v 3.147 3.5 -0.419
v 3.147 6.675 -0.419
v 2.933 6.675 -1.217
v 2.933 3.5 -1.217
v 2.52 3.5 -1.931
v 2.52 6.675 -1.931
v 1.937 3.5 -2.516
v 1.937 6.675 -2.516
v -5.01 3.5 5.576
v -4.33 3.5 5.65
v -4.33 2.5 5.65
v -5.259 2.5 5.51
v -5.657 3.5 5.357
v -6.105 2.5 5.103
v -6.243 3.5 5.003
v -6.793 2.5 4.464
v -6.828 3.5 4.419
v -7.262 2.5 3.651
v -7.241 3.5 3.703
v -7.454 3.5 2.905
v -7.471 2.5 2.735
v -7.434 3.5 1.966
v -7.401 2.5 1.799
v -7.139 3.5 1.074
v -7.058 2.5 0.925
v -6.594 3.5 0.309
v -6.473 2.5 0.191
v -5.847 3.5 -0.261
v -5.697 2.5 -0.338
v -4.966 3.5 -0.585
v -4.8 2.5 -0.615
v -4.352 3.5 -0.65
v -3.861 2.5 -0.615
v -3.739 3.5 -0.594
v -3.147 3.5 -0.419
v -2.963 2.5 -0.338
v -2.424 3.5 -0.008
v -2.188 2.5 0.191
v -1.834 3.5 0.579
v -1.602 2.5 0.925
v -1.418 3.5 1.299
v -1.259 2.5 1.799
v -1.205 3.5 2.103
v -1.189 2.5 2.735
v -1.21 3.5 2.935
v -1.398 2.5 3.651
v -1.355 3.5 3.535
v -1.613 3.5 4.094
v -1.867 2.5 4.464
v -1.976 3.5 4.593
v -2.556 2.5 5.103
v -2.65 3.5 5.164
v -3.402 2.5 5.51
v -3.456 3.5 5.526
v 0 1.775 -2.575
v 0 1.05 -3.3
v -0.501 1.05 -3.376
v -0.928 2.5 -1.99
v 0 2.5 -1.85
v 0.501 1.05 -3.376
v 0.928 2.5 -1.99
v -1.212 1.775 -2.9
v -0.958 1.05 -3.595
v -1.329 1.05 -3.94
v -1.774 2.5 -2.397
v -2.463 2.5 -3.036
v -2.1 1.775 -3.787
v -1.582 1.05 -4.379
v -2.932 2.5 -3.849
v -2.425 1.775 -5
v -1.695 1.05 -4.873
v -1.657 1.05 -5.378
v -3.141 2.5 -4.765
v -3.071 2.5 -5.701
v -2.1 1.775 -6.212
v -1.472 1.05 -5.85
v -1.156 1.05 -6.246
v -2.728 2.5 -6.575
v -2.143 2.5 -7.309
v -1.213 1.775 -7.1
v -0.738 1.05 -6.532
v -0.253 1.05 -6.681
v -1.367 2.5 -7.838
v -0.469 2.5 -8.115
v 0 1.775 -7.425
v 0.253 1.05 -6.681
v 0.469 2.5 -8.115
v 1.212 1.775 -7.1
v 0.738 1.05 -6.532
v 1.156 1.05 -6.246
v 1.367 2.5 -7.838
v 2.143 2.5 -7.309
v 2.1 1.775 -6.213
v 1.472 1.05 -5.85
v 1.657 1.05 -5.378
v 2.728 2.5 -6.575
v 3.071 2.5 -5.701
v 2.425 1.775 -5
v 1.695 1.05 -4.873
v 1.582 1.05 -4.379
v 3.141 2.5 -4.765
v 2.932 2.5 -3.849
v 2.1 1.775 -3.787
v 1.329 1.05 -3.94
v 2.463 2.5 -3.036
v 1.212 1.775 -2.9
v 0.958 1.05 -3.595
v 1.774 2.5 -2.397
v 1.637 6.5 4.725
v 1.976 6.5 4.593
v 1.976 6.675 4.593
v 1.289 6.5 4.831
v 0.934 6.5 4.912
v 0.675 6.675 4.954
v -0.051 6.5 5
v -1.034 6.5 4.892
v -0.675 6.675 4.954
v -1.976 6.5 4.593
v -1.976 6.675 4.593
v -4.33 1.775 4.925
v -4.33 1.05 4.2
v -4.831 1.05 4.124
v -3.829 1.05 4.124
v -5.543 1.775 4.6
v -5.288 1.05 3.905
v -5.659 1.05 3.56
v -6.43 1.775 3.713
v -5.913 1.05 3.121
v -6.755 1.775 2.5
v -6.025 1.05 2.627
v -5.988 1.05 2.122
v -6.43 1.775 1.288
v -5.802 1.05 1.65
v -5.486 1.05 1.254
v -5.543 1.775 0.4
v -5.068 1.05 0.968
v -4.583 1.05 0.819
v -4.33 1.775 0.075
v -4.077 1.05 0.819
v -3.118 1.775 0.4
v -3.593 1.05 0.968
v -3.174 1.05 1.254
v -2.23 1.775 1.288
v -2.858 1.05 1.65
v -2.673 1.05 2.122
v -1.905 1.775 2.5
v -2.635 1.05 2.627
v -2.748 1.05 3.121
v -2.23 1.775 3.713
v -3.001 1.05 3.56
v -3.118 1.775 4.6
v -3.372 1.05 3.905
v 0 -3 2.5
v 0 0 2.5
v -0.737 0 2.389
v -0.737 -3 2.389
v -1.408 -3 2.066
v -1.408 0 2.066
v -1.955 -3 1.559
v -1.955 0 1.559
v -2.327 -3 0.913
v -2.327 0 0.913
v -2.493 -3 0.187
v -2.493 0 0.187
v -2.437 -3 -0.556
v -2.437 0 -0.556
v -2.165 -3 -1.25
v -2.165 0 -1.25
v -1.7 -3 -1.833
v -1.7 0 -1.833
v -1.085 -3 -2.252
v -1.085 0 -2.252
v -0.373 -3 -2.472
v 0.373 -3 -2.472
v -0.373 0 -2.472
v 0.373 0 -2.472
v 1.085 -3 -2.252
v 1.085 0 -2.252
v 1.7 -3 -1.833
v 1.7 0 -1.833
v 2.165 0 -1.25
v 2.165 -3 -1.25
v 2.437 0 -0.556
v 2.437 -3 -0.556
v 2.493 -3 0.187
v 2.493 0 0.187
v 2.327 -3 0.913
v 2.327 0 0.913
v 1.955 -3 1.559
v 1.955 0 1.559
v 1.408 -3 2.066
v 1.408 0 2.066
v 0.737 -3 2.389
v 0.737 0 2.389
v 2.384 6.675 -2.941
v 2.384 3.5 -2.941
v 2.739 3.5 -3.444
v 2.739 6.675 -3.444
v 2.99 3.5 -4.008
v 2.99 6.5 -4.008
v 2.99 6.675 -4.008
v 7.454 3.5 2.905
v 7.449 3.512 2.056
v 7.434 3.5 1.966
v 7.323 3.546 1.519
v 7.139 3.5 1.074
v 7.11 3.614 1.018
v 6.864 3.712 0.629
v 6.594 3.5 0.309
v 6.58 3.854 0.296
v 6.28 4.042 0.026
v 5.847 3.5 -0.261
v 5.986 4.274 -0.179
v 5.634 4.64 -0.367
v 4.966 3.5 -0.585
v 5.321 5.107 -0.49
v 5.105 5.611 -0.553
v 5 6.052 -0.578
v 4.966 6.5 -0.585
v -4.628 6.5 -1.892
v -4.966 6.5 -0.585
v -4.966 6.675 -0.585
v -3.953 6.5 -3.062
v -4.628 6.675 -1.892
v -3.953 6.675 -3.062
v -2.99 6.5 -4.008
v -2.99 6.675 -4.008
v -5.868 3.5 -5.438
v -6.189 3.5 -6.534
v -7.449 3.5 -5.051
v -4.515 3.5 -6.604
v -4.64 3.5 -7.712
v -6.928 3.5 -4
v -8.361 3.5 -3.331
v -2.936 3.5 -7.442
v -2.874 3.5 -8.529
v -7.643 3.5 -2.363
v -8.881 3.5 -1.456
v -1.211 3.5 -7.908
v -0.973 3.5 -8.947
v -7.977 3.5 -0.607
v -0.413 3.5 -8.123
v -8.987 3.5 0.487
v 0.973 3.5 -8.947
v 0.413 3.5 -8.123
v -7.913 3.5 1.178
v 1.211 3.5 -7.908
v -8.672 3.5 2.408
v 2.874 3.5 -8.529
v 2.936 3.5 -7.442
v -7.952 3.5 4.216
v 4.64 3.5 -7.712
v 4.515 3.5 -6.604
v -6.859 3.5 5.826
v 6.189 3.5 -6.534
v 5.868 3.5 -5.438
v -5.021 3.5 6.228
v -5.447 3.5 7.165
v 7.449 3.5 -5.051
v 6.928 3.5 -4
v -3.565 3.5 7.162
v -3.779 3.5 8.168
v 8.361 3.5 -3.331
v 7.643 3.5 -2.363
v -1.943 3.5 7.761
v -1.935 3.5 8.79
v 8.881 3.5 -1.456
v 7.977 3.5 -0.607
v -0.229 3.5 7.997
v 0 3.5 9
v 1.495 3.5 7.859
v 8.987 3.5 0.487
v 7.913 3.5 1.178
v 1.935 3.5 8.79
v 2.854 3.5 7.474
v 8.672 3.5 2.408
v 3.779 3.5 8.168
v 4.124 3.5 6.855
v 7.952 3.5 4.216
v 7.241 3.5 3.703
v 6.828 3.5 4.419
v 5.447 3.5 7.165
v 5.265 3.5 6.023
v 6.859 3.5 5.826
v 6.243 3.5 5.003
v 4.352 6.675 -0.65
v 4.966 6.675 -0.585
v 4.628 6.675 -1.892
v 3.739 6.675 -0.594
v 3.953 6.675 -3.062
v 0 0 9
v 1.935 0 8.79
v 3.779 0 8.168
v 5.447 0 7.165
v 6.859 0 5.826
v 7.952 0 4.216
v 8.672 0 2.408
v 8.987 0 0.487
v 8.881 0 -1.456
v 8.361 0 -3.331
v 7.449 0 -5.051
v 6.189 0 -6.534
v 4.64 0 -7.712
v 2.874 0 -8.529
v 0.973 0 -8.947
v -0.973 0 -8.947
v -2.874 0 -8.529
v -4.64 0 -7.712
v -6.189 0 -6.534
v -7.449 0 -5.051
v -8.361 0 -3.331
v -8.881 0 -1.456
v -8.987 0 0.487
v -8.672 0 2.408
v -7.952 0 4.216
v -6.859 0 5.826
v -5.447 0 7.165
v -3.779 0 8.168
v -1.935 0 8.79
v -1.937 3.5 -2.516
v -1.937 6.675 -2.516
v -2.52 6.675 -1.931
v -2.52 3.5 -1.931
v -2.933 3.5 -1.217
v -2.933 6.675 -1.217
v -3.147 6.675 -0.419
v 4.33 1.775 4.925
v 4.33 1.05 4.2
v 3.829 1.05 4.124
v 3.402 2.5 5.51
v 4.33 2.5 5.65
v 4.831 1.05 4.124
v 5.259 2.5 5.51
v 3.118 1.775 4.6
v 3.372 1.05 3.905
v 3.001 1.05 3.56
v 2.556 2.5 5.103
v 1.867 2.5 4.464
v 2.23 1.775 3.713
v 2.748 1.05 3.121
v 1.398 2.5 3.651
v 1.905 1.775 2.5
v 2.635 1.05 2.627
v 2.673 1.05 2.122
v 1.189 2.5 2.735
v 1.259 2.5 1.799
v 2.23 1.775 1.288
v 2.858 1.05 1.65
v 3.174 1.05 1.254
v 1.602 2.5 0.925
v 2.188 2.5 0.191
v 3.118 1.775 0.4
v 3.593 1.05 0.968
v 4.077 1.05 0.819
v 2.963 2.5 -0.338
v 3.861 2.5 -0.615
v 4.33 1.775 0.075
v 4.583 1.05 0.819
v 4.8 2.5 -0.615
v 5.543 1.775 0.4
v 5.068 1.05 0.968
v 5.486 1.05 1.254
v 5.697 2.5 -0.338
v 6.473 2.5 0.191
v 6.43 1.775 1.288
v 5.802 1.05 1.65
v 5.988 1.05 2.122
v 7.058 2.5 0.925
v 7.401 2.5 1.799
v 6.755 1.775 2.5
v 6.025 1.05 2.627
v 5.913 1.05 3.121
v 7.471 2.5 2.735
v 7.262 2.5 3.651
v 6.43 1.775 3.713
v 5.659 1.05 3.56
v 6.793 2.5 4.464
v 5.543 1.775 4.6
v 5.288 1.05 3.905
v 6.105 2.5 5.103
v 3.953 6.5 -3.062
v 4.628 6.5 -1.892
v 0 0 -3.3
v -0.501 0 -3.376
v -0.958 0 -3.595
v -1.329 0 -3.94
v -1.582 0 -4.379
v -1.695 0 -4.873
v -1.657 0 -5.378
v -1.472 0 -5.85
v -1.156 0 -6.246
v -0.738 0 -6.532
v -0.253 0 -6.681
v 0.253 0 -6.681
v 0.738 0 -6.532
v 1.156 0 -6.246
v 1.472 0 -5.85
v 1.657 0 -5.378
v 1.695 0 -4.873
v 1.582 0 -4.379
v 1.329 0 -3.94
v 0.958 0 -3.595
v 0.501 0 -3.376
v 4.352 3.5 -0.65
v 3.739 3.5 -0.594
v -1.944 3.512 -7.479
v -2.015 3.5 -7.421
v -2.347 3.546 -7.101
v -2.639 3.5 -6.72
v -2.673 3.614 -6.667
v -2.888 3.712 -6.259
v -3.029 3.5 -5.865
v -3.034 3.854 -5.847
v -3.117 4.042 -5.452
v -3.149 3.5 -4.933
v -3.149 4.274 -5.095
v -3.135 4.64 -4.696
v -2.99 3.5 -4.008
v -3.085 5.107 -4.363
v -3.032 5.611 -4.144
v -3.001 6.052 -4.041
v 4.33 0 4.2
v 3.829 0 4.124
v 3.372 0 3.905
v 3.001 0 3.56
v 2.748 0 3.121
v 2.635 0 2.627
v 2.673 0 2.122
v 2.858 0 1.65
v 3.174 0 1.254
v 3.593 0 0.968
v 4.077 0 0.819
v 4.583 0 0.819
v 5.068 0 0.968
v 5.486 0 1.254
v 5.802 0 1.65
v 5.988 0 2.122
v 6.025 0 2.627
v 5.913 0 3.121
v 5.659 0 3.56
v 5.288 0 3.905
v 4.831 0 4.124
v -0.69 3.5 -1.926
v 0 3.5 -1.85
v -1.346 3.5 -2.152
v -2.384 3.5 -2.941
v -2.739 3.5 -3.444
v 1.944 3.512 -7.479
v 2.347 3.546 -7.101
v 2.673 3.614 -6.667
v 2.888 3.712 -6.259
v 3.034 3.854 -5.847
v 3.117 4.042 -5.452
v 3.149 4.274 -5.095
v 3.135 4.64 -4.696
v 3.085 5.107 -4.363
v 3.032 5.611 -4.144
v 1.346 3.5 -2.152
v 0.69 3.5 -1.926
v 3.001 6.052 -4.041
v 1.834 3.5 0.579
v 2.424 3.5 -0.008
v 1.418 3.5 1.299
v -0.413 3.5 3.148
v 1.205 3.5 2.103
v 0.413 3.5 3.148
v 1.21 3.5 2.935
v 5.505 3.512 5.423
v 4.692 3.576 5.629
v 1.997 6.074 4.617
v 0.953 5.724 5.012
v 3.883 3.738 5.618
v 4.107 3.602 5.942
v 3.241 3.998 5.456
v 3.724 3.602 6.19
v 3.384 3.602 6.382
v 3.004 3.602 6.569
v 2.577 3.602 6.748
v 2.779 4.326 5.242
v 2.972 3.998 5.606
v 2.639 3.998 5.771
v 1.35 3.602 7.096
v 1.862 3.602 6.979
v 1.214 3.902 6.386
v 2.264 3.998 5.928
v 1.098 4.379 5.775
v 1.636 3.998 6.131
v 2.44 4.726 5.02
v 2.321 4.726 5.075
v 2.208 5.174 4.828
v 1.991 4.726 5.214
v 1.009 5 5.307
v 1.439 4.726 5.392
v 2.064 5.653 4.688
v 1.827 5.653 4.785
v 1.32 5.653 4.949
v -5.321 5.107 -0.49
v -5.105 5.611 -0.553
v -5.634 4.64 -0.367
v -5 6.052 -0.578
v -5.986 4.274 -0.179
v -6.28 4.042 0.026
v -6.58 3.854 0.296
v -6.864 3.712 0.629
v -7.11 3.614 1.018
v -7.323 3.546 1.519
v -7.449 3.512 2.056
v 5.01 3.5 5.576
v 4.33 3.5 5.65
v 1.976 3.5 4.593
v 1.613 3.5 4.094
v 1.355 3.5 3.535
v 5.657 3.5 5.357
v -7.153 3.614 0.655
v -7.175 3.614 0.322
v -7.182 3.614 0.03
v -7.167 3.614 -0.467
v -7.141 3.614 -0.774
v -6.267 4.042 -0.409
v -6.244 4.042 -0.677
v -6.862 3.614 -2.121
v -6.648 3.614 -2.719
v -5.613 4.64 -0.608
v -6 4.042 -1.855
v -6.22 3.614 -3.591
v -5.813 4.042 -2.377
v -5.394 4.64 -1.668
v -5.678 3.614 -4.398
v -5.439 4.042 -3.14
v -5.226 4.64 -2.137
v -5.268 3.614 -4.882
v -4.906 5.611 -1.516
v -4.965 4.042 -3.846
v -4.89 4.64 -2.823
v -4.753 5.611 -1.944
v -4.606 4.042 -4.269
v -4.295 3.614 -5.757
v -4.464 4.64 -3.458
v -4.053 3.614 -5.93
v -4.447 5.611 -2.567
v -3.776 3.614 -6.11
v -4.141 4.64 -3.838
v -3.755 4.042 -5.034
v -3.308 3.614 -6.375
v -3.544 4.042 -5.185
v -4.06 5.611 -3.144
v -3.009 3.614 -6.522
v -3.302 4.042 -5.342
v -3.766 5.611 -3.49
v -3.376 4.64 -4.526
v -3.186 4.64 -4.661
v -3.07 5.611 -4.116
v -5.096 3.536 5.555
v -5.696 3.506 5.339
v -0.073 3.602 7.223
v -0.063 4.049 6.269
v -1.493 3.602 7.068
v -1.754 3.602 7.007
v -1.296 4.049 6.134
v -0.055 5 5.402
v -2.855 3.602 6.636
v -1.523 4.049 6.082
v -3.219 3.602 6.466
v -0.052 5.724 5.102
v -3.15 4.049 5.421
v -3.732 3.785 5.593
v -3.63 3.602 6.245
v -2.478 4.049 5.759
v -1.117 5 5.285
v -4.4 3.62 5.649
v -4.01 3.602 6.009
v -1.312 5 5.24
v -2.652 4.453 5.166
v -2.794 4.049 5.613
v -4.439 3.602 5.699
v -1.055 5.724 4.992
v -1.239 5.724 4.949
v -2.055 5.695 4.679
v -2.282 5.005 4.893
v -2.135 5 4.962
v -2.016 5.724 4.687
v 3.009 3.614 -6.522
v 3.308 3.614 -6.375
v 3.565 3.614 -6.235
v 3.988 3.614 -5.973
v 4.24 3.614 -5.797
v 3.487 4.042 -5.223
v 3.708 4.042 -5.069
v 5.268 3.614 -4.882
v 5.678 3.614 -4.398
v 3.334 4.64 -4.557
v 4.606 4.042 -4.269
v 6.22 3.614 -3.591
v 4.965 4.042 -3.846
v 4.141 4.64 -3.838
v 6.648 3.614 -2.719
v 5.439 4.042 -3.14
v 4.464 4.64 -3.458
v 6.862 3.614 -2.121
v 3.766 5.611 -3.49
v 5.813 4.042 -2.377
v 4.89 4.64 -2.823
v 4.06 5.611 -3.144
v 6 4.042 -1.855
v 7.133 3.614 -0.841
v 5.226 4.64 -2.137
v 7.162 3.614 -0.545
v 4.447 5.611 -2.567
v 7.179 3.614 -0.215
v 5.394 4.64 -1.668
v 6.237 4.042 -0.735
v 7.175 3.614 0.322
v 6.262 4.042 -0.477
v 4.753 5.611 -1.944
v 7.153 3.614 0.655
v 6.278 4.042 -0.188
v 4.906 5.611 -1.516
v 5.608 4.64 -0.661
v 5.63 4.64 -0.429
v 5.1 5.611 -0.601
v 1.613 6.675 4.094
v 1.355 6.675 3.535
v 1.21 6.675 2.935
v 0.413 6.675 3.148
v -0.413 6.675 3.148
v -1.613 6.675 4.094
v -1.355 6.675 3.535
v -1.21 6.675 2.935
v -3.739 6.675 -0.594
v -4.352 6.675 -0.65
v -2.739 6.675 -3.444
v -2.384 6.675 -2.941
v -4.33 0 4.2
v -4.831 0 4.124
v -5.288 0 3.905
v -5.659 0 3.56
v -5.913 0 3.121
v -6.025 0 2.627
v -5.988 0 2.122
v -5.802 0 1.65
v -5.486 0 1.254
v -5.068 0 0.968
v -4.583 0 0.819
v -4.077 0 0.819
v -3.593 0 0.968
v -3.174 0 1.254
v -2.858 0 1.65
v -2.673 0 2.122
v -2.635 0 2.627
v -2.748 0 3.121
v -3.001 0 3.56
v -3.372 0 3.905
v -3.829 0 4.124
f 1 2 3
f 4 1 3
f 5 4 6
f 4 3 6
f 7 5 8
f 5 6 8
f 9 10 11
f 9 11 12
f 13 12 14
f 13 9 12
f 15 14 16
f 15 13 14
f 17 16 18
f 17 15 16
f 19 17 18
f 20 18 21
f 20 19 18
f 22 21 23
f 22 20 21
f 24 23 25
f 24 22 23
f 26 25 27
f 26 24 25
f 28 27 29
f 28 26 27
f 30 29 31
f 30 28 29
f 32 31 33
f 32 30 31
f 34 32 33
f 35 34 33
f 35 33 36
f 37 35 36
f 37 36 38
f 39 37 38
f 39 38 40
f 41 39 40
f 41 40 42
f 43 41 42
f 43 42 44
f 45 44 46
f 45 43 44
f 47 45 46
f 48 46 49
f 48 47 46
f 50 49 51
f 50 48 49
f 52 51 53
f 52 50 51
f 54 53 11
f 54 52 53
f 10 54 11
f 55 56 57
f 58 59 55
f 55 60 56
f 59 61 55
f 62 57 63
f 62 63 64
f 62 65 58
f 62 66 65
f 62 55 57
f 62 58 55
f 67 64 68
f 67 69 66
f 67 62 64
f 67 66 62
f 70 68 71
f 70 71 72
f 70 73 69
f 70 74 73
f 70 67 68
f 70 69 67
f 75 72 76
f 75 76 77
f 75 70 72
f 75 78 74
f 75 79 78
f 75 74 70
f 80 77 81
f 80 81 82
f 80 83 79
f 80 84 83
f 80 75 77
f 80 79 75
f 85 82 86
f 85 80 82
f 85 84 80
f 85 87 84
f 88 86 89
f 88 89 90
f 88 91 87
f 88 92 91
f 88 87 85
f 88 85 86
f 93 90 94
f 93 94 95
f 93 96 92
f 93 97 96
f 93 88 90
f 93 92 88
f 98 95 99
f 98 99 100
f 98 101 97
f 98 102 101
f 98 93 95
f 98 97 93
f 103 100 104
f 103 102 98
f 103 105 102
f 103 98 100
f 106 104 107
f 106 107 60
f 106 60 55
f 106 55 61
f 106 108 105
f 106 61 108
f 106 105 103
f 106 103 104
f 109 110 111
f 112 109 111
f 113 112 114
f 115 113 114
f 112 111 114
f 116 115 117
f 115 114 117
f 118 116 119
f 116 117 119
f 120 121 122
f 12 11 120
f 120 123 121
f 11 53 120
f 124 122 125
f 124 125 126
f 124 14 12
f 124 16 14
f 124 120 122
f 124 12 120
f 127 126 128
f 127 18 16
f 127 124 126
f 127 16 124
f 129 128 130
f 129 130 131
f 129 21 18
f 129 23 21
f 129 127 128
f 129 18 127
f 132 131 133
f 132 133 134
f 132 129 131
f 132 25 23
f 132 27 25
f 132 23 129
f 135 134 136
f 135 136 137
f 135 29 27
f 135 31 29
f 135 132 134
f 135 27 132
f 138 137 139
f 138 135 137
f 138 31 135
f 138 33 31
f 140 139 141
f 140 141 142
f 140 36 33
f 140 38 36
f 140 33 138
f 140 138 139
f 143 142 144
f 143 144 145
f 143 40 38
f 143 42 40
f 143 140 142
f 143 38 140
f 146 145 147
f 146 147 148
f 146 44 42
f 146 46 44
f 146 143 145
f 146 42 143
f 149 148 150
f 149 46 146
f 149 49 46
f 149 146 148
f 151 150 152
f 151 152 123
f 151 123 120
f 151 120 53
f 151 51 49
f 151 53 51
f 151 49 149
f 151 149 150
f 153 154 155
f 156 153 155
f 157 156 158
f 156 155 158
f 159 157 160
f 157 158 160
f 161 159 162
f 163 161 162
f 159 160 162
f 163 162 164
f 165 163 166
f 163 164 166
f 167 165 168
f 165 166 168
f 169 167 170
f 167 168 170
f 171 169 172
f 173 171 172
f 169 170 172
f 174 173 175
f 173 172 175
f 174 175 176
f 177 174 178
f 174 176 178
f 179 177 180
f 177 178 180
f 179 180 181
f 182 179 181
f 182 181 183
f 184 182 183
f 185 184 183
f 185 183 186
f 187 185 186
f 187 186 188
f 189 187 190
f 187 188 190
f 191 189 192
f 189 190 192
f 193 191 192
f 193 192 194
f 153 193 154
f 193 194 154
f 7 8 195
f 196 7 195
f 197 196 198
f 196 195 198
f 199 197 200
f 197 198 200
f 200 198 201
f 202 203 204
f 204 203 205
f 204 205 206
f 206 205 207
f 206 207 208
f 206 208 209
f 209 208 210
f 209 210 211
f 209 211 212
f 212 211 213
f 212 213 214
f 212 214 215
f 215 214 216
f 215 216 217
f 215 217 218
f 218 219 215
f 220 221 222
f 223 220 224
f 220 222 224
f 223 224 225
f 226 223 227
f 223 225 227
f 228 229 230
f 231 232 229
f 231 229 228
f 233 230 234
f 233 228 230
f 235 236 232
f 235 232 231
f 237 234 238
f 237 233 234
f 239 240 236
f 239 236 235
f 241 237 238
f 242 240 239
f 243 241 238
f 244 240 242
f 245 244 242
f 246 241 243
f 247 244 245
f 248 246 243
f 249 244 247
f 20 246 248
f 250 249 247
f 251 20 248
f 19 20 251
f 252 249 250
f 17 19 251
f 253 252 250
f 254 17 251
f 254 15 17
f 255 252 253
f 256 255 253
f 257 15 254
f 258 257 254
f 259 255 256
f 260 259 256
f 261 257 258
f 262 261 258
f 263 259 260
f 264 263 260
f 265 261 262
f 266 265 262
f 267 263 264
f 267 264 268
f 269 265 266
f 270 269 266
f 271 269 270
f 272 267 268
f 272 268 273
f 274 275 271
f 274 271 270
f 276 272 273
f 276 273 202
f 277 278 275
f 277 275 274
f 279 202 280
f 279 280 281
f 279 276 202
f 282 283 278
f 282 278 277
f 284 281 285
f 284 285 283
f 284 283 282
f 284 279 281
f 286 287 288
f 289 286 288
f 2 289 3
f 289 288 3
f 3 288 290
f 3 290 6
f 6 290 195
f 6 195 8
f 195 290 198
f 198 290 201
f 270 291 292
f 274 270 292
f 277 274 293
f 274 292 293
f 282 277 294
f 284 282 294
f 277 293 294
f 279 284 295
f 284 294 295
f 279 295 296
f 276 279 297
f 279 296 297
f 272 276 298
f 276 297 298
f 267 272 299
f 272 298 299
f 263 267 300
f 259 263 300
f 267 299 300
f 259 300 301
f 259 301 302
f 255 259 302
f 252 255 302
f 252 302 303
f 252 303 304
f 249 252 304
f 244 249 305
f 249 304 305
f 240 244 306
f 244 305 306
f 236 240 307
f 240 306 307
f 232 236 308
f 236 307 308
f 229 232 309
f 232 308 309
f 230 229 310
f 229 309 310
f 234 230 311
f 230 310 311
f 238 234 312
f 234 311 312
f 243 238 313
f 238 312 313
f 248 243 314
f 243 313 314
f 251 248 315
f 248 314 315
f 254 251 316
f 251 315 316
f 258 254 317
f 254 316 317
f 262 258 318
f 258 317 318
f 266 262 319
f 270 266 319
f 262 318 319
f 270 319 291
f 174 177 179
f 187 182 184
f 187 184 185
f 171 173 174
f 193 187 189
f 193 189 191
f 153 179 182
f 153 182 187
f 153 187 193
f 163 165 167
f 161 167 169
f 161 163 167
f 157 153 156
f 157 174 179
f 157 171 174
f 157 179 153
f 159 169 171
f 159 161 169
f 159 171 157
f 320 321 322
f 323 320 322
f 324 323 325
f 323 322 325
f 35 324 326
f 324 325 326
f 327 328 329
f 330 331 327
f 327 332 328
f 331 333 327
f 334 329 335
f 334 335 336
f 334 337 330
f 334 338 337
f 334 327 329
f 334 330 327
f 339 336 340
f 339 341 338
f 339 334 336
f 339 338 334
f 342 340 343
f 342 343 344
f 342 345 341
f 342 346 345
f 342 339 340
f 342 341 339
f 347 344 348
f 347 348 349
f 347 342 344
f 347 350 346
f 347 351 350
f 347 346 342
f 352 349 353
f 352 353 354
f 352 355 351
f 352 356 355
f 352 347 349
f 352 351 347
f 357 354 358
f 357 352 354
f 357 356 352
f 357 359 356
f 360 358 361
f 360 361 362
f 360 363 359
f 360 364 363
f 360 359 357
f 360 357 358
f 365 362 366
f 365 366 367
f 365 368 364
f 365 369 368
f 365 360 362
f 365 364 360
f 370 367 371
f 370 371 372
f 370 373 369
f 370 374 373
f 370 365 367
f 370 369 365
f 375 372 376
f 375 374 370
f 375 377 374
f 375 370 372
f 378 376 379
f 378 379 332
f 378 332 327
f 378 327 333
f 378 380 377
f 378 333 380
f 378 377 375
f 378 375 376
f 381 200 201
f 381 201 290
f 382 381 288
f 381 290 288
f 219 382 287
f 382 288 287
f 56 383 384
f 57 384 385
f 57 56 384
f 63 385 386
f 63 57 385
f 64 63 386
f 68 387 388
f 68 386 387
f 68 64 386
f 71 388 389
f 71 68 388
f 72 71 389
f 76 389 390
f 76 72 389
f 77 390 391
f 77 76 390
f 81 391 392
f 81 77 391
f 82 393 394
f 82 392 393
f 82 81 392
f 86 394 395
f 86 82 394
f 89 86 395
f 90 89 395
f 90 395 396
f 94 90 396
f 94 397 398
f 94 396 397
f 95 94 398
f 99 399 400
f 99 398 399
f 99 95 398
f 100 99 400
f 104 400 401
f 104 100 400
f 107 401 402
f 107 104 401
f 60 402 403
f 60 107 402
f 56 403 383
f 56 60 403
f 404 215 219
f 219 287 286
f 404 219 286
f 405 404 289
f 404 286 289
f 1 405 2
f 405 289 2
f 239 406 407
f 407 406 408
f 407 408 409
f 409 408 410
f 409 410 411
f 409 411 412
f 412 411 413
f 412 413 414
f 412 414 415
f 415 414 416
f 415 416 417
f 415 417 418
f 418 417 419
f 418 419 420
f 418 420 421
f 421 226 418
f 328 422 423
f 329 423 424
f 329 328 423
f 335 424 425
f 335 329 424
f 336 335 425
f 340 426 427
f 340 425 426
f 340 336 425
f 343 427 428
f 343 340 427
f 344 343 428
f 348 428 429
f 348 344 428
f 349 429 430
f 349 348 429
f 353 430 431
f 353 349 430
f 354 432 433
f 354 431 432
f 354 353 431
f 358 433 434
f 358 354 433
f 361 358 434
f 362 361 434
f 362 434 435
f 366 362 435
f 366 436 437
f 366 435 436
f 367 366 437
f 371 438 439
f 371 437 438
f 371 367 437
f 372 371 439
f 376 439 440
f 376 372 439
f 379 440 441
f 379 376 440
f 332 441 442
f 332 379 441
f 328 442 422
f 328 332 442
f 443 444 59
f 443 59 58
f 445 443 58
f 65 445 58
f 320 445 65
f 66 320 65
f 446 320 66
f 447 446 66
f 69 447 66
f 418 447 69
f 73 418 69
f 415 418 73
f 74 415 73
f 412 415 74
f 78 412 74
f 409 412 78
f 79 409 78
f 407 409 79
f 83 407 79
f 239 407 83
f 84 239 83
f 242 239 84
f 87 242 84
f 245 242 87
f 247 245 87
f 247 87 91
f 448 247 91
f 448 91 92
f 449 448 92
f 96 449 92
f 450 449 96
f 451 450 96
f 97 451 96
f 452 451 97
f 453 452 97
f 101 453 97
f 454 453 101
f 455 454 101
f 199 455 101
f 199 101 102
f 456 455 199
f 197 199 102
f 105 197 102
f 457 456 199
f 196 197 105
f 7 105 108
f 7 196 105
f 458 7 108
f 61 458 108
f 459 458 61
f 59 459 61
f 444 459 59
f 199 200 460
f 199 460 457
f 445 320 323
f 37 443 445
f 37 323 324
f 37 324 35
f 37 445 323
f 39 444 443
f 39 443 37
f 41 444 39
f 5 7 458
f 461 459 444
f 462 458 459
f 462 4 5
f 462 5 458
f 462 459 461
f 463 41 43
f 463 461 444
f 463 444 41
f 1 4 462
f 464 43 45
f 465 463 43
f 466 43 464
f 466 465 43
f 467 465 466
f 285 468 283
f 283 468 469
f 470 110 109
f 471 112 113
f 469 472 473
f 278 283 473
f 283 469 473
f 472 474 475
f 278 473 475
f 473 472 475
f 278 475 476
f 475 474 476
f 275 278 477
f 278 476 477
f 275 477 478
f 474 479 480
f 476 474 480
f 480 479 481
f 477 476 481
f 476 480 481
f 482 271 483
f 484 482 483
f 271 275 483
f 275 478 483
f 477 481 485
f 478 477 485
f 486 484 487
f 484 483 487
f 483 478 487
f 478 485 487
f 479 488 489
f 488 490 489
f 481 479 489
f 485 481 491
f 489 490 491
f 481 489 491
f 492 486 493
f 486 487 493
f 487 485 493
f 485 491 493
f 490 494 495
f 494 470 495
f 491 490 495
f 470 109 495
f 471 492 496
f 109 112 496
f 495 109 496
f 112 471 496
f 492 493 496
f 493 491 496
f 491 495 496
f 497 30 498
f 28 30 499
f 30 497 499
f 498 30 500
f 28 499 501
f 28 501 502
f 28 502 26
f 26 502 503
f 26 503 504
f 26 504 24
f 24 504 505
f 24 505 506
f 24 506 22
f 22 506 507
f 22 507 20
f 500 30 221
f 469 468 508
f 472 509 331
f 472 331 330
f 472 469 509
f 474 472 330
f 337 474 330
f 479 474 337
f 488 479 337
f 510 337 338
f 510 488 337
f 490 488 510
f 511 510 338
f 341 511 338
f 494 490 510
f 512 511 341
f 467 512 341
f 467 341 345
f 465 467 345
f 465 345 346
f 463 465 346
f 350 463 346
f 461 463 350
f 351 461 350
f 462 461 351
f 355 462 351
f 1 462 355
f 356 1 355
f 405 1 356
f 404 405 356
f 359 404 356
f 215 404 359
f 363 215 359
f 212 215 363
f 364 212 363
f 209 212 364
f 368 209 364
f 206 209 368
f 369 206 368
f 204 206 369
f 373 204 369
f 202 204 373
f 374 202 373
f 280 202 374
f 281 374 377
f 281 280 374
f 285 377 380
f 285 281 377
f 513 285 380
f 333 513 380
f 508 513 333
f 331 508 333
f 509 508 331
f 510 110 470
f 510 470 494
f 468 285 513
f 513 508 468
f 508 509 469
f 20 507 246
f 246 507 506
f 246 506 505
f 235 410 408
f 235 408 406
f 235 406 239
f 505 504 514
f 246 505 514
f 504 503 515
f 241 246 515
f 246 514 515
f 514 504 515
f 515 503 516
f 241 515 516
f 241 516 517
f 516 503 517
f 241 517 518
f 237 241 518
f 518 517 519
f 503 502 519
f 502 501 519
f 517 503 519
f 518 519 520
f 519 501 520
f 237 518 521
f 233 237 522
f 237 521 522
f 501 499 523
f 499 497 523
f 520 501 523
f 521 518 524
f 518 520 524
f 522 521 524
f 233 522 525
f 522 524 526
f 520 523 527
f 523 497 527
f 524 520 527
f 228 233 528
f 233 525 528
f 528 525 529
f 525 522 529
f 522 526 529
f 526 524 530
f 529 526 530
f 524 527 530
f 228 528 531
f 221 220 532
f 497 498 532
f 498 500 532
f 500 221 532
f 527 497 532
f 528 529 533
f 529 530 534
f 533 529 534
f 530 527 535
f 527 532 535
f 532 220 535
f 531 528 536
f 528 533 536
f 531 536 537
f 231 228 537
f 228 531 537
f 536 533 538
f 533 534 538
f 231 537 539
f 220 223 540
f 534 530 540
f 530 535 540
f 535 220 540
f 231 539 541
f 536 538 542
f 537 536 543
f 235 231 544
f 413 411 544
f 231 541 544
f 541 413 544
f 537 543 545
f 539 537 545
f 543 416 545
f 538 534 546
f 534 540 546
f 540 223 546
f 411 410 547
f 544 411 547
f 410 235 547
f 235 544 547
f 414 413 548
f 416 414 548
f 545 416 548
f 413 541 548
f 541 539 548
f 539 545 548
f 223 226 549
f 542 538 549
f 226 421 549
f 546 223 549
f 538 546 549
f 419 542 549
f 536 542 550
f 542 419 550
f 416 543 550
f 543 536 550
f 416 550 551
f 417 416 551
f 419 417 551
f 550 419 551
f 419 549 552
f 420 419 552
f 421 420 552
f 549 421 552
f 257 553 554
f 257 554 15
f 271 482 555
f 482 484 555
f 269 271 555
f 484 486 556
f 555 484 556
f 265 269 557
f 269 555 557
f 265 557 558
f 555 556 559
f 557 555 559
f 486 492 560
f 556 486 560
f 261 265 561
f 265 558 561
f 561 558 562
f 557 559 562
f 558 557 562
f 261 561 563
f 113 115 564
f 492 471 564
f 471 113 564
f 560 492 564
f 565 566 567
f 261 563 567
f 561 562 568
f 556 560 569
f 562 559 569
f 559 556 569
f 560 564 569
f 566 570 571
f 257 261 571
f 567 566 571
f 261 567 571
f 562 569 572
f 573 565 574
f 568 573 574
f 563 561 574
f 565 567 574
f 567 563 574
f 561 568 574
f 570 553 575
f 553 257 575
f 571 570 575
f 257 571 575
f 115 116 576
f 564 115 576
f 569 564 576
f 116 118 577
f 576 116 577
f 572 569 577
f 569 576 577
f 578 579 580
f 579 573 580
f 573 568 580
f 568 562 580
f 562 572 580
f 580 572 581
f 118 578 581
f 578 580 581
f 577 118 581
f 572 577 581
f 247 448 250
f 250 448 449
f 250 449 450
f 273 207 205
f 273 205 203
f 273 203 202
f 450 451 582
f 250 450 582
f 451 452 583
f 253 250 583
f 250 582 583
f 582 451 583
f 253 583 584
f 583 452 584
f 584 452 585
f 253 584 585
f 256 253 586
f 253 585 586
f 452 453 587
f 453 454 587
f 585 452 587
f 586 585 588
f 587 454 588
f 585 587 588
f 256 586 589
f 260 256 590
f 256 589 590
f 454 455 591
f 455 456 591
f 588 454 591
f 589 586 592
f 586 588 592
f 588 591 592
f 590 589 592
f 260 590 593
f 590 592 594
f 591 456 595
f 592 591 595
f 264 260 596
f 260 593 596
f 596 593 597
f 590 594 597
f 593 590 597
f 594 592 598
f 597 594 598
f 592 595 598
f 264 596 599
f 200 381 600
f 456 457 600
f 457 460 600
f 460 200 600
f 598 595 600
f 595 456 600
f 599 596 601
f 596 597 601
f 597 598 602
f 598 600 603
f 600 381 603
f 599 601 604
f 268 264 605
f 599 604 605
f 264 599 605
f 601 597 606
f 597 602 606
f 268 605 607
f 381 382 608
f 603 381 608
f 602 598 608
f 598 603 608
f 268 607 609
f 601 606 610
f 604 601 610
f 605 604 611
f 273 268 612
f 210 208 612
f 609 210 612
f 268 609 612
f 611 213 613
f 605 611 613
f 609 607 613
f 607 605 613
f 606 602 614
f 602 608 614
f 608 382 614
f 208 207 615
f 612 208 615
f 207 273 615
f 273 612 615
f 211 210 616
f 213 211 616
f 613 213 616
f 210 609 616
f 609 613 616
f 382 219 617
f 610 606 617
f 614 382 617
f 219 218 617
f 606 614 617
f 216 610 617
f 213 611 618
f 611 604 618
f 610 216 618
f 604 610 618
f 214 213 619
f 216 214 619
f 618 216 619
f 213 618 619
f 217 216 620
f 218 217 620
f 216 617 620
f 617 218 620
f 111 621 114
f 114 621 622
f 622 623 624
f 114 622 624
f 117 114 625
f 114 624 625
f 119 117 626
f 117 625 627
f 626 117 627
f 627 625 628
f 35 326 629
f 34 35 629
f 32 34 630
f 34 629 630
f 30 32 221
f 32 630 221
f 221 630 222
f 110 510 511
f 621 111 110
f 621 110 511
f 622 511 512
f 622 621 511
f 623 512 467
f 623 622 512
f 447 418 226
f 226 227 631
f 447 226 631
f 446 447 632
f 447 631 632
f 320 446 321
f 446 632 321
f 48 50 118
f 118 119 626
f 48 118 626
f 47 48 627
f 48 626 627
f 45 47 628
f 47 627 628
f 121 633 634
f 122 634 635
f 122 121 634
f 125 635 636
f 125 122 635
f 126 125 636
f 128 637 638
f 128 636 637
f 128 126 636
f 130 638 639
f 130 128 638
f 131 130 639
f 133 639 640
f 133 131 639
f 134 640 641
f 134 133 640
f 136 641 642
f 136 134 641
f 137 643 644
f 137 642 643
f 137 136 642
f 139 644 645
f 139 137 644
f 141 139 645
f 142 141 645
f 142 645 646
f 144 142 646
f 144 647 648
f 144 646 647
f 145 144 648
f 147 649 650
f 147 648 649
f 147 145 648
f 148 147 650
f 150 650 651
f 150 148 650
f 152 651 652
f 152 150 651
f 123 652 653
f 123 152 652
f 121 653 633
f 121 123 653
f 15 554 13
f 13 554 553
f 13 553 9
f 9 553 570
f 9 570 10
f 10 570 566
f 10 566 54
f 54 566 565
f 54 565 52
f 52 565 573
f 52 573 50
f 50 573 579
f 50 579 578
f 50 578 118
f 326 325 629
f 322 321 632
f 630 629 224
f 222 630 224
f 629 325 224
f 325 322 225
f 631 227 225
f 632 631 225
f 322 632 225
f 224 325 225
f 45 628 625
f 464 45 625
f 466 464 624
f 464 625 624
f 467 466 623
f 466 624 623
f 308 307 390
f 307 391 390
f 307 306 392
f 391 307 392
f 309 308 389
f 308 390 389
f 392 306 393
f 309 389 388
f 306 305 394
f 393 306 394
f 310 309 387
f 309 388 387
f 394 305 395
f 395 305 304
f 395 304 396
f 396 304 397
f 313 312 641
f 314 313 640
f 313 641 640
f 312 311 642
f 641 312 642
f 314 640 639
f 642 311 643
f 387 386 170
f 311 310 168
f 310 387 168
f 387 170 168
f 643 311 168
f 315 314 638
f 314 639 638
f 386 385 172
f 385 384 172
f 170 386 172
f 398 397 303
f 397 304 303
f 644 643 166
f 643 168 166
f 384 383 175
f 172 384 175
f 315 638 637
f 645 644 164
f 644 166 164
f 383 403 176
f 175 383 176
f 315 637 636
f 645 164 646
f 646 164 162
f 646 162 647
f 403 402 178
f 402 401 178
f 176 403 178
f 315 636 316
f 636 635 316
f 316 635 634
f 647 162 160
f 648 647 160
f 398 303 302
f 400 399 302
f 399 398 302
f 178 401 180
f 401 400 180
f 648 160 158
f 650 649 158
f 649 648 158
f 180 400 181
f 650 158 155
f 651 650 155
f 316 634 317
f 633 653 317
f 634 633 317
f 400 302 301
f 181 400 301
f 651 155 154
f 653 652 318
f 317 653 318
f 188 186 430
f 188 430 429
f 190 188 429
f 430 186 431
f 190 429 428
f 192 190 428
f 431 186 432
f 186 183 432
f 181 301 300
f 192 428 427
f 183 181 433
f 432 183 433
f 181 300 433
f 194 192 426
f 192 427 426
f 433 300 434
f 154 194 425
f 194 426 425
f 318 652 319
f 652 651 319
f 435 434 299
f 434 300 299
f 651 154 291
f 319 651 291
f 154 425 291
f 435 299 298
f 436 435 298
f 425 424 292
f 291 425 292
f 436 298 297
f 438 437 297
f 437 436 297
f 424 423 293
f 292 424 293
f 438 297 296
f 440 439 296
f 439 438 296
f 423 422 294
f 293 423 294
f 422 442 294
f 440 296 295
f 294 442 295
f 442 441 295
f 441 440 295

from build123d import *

# Parameters (mm, degrees)
SKETCH1_R                                      = 9
BOSS_EXTRUDE1_DEPTH                            = 3.5
CSK_FOR_M3_FLAT_HEAD_MACHINE_SCREW1_AT_2_COUNT = 2
CSK_FOR_M3_FLAT_HEAD_MACHINE_SCREW1_AT_2_PITCH = 8.660254038
CSK_FOR_M3_FLAT_HEAD_MACHINE_SCREW1_AT_3_COUNT = 2
CSK_FOR_M3_FLAT_HEAD_MACHINE_SCREW1_AT_3_PITCH = 8.660254038
BOSS_EXTRUDE2_START                            = 3.175
BOSS_EXTRUDE2_DEPTH                            = 3.175
FILLET1_R                                      = 3
SKETCH6_R                                      = 2.5
BOSS_EXTRUDE3_DEPTH                            = 3


with BuildPart() as part:
    # Sketch1 → Boss-Extrude1 (new body)
    with BuildSketch(Plane(origin=(0, 0, 0), x_dir=(1, 0, 0), z_dir=(0, 1, 0))):
        with Locations(Location((0, 0, 0), (0, 0, 270))):
            Circle(SKETCH1_R)
    extrude(amount=BOSS_EXTRUDE1_DEPTH)

    # Sketch3 → CSK for M3 Flat Head Machine Screw1 (revolve, cut)
    with BuildSketch(Plane(origin=(0, 3.5, -5), x_dir=(0, 0, 1), z_dir=(1, 0, 0))):
        Polygon((0, 0), (0, 11.021463052), (1.7, 10), (1.7, 2.45), (3.15, 1), (3.15, 0), align=None)
    csk_for_m3_flat_head_machine_screw1 = revolve(axis=Axis((0, 9.85, -5), (0, -1, 0)), mode=Mode.SUBTRACT)

    # CSK for M3 Flat Head Machine Screw1 at 2: CSK for M3 Flat Head Machine Screw1 ×2
    with Locations(*[Vector(0.5000000000000012, 0, 0.866025403784438) * (i * CSK_FOR_M3_FLAT_HEAD_MACHINE_SCREW1_AT_2_PITCH) for i in range(1, CSK_FOR_M3_FLAT_HEAD_MACHINE_SCREW1_AT_2_COUNT)]):
        add(csk_for_m3_flat_head_machine_screw1, mode=Mode.SUBTRACT)

    # CSK for M3 Flat Head Machine Screw1 at 3: CSK for M3 Flat Head Machine Screw1 ×2
    with Locations(*[Vector(-0.500000000000001, 0, 0.8660254037844382) * (i * CSK_FOR_M3_FLAT_HEAD_MACHINE_SCREW1_AT_3_PITCH) for i in range(1, CSK_FOR_M3_FLAT_HEAD_MACHINE_SCREW1_AT_3_COUNT)]):
        add(csk_for_m3_flat_head_machine_screw1, mode=Mode.SUBTRACT)

    # Sketch5 → Boss-Extrude2 (add)
    with BuildSketch(Plane(origin=(0, 3.5, 0), x_dir=(1, 0, 0), z_dir=(0, 1, 0)).offset(BOSS_EXTRUDE2_START)):
        with BuildLine():
            ThreePointArc((-1.93683052, 2.5158125), (-2.749630657, 1.5875), (-3.147172796, 0.419438184))
            ThreePointArc((-3.147172796, 0.419438184), (-4.044126051, 0.636989552), (-4.965632694, 0.585228118))
            ThreePointArc((-4.965632694, 0.585228118), (-4.330127019, 2.5), (-2.989638764, 4.00775))
            ThreePointArc((-2.989638764, 4.00775), (-2.573712159, 3.183821121), (-1.93683052, 2.5158125))
        make_face()
        with BuildLine():
            ThreePointArc((4.965632694, 0.585228118), (4.044126051, 0.636989552), (3.147172796, 0.419438184))
            ThreePointArc((3.147172796, 0.419438184), (2.749630657, 1.5875), (1.93683052, 2.5158125))
            ThreePointArc((1.93683052, 2.5158125), (2.573712159, 3.183821121), (2.989638764, 4.00775))
            ThreePointArc((2.989638764, 4.00775), (4.330127019, 2.5), (4.965632694, 0.585228118))
        make_face()
        with BuildLine():
            ThreePointArc((-1.97599393, -4.592978118), (-1.470413892, -3.820810672), (-1.210342276, -2.935250684))
            ThreePointArc((-1.210342276, -2.935250684), (0, -3.175), (1.210342276, -2.935250684))
            ThreePointArc((1.210342276, -2.935250684), (1.470413892, -3.820810672), (1.97599393, -4.592978118))
            ThreePointArc((1.97599393, -4.592978118), (0, -5), (-1.97599393, -4.592978118))
        make_face()
    extrude(amount=-BOSS_EXTRUDE2_DEPTH)

    # Fillet1
    # the kernel refuses this fillet: 3 mm, written as the material it adds along each edge
    with BuildSketch(Plane(origin=(0, 3.5, 0), x_dir=(-0.1868450460832527, 0, 0.9823893977207547), z_dir=(0.9823893977207547, 0, 0.1868450460832527))) as fillet1_piece_1_section:
        with BuildLine():
            CenterArc((5 + FILLET1_R, -FILLET1_R), FILLET1_R, 90, 90)
            Line((5, -FILLET1_R), (5, 0))
            Line((5, 0), (5 + FILLET1_R, 0))
        make_face()
    fillet1_piece_1 = revolve(axis=Axis((0, 3.5, 0), (0, -1, 0)), revolution_arc=218.462556698, mode=Mode.PRIVATE)
    fillet1_piece_1 = fillet1_piece_1 - Plane(origin=(-4.330127019, 4.03591181, 2.5), x_dir=(0, 0, 1), z_dir=(0, 1, 0)) * Cylinder(3.15, 33, mode=Mode.PRIVATE)
    fillet1_piece_1 = fillet1_piece_1 - Plane(origin=(0, 4.03591181, -5), x_dir=(0, 0, 1), z_dir=(0, 1, 0)) * Cylinder(3.15, 33, mode=Mode.PRIVATE)
    add(fillet1_piece_1)
    with BuildSketch(Plane(origin=(0, 3.5, 0), x_dir=(0.9441966978762919, 0, -0.3293821423810138), z_dir=(-0.3293821423810138, 0, -0.9441966978762919))) as fillet1_piece_2_section:
        with BuildLine():
            CenterArc((5 + FILLET1_R, -FILLET1_R), FILLET1_R, 90, 90)
            Line((5, -FILLET1_R), (5, 0))
            Line((5, 0), (5 + FILLET1_R, 0))
        make_face()
    fillet1_piece_2 = revolve(axis=Axis((0, 3.5, 0), (0, -1, 0)), revolution_arc=218.462556698, mode=Mode.PRIVATE)
    fillet1_piece_2 = fillet1_piece_2 - Plane(origin=(-4.330127019, 4.035911774, 2.5), x_dir=(0, 0, 1), z_dir=(0, 1, 0)) * Cylinder(3.15, 33, mode=Mode.PRIVATE)
    fillet1_piece_2 = fillet1_piece_2 - Plane(origin=(4.330127019, 4.035911774, 2.5), x_dir=(0, 0, 1), z_dir=(0, 1, 0)) * Cylinder(3.15, 33, mode=Mode.PRIVATE)
    add(fillet1_piece_2)
    with BuildSketch(Plane(origin=(0, 3.5, 0), x_dir=(-0.7573516517930461, 0, -0.6530072553397431), z_dir=(-0.6530072553397431, 0, 0.7573516517930461))) as fillet1_piece_3_section:
        with BuildLine():
            CenterArc((5 + FILLET1_R, -FILLET1_R), FILLET1_R, 90, 90)
            Line((5, -FILLET1_R), (5, 0))
            Line((5, 0), (5 + FILLET1_R, 0))
        make_face()
    fillet1_piece_3 = revolve(axis=Axis((0, 3.5, 0), (0, -1, 0)), revolution_arc=218.462556698, mode=Mode.PRIVATE)
    fillet1_piece_3 = fillet1_piece_3 - Plane(origin=(4.330127019, 4.035911774, 2.5), x_dir=(0, 0, 1), z_dir=(0, 1, 0)) * Cylinder(3.15, 32, mode=Mode.PRIVATE)
    fillet1_piece_3 = fillet1_piece_3 - Plane(origin=(0, 4.035911774, -5), x_dir=(0, 0, 1), z_dir=(0, 1, 0)) * Cylinder(3.15, 32, mode=Mode.PRIVATE)
    add(fillet1_piece_3)

    # Sketch6 → Boss-Extrude3 (add)
    with BuildSketch(Plane.XZ):
        with Locations(Location((0, 0, 0), (0, 0, 90))):
            Circle(SKETCH6_R)
    extrude(amount=BOSS_EXTRUDE3_DEPTH)


solid = part.part
